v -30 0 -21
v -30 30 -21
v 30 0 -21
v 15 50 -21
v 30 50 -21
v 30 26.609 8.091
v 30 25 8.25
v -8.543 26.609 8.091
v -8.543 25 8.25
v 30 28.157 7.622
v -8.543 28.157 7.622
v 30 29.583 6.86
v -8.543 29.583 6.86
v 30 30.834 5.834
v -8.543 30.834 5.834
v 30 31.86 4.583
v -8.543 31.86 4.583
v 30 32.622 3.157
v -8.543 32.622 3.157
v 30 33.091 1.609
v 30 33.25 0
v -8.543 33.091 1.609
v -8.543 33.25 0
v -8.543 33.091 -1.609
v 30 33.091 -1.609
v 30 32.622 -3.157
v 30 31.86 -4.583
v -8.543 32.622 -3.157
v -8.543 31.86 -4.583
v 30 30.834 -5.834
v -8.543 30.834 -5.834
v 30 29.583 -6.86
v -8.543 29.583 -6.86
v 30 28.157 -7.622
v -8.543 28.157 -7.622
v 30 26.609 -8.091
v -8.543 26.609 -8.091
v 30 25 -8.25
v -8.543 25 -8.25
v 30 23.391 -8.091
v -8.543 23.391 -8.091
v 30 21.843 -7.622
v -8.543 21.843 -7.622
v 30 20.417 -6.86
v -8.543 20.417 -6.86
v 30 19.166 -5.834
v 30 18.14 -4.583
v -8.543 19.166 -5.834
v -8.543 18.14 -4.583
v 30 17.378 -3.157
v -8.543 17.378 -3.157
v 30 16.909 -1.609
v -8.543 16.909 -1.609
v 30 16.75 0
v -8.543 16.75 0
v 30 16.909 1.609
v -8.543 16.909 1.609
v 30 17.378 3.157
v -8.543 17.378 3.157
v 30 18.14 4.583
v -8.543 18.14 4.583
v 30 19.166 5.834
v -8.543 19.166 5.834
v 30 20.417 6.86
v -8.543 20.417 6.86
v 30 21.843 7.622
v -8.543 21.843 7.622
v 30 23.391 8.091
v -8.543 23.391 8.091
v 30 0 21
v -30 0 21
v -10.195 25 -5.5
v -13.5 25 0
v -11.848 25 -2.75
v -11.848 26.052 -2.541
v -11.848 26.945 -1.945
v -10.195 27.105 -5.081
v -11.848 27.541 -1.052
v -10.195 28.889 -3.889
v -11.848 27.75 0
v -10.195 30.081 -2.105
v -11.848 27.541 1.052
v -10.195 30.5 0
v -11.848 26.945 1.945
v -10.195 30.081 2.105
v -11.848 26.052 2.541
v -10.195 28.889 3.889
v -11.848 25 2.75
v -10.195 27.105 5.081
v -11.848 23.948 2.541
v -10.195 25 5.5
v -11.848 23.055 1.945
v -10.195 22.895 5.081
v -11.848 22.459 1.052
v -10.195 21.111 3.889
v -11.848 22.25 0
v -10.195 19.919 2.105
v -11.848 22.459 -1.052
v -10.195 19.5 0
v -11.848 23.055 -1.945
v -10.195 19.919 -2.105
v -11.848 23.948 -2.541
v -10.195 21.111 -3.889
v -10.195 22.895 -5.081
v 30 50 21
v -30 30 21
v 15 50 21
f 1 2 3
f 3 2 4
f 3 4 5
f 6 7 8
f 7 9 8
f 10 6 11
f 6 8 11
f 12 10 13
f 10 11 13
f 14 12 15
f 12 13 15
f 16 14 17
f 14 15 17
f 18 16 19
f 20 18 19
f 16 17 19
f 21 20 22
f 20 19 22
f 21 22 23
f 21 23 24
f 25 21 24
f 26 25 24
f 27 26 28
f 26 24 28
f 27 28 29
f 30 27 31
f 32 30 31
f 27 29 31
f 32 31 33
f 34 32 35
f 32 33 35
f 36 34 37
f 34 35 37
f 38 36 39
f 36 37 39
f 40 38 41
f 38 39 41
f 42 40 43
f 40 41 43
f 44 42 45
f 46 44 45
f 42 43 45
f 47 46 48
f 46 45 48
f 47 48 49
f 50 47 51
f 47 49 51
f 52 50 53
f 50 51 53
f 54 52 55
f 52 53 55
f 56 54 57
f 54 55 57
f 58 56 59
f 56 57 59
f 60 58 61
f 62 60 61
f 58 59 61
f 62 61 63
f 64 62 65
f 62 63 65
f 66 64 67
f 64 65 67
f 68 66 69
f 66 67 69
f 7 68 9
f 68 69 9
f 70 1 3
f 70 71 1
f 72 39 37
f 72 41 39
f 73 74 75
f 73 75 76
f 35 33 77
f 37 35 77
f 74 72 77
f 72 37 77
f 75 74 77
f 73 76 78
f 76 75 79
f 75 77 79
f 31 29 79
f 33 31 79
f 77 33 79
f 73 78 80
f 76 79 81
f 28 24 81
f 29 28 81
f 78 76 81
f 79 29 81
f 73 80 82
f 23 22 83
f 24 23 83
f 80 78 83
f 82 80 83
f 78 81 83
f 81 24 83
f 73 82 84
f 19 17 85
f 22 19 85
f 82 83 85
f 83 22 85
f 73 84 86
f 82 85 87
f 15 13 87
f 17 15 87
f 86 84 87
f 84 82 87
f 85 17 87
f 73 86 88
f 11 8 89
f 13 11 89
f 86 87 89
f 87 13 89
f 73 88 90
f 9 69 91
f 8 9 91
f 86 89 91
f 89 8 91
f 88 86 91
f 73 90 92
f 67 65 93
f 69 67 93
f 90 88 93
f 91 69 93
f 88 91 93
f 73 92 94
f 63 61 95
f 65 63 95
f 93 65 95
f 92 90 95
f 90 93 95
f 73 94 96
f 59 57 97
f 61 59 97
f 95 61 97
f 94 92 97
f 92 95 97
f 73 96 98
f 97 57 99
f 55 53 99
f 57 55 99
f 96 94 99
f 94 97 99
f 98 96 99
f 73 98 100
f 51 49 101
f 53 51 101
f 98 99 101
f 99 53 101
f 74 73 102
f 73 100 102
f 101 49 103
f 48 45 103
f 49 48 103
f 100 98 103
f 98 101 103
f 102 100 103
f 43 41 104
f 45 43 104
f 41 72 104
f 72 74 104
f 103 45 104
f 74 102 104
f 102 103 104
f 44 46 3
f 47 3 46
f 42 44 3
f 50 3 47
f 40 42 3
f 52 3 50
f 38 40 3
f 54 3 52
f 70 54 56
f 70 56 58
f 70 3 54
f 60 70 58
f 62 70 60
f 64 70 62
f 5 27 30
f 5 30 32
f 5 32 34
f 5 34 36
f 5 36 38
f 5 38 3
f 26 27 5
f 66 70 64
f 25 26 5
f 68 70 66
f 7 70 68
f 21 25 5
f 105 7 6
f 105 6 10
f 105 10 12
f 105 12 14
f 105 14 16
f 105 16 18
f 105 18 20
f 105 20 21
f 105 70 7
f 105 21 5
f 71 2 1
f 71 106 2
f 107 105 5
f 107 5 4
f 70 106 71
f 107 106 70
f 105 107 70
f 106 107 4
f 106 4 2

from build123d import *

# Parameters (mm, degrees)
ESTRUSIONE_ESTRUSIONE1_DEPTH   = 21
FORO_FILETTATO_M18X1_5_1_D     = 16.5
FORO_FILETTATO_M18X1_5_1_DEPTH = 38.542899893
FORO_FILETTATO_M18X1_5_1_TIP   = 4.957100107


with BuildPart() as part:
    # Schizzo1 → Estrusione-Estrusione1 (new, symmetric)
    with BuildSketch(Plane.XY):
        Polygon((30, 0), (30, 50), (15, 50), (-30, 30), (-30, 0), align=None)
    extrude(amount=ESTRUSIONE_ESTRUSIONE1_DEPTH, both=True)

    # Foro filettato M18x1.5-1
    with Locations(Plane(origin=(30, 0, 0), x_dir=(0, 0, -1), z_dir=(1, 0, 0))):
        with Locations((0, 25)):
            Hole(FORO_FILETTATO_M18X1_5_1_D / 2, depth=FORO_FILETTATO_M18X1_5_1_DEPTH)
            with Locations((0, 0, -(FORO_FILETTATO_M18X1_5_1_DEPTH + FORO_FILETTATO_M18X1_5_1_TIP / 2))):  # 118° drill point
                Cone(0, FORO_FILETTATO_M18X1_5_1_D / 2, FORO_FILETTATO_M18X1_5_1_TIP, mode=Mode.SUBTRACT)


solid = part.part
